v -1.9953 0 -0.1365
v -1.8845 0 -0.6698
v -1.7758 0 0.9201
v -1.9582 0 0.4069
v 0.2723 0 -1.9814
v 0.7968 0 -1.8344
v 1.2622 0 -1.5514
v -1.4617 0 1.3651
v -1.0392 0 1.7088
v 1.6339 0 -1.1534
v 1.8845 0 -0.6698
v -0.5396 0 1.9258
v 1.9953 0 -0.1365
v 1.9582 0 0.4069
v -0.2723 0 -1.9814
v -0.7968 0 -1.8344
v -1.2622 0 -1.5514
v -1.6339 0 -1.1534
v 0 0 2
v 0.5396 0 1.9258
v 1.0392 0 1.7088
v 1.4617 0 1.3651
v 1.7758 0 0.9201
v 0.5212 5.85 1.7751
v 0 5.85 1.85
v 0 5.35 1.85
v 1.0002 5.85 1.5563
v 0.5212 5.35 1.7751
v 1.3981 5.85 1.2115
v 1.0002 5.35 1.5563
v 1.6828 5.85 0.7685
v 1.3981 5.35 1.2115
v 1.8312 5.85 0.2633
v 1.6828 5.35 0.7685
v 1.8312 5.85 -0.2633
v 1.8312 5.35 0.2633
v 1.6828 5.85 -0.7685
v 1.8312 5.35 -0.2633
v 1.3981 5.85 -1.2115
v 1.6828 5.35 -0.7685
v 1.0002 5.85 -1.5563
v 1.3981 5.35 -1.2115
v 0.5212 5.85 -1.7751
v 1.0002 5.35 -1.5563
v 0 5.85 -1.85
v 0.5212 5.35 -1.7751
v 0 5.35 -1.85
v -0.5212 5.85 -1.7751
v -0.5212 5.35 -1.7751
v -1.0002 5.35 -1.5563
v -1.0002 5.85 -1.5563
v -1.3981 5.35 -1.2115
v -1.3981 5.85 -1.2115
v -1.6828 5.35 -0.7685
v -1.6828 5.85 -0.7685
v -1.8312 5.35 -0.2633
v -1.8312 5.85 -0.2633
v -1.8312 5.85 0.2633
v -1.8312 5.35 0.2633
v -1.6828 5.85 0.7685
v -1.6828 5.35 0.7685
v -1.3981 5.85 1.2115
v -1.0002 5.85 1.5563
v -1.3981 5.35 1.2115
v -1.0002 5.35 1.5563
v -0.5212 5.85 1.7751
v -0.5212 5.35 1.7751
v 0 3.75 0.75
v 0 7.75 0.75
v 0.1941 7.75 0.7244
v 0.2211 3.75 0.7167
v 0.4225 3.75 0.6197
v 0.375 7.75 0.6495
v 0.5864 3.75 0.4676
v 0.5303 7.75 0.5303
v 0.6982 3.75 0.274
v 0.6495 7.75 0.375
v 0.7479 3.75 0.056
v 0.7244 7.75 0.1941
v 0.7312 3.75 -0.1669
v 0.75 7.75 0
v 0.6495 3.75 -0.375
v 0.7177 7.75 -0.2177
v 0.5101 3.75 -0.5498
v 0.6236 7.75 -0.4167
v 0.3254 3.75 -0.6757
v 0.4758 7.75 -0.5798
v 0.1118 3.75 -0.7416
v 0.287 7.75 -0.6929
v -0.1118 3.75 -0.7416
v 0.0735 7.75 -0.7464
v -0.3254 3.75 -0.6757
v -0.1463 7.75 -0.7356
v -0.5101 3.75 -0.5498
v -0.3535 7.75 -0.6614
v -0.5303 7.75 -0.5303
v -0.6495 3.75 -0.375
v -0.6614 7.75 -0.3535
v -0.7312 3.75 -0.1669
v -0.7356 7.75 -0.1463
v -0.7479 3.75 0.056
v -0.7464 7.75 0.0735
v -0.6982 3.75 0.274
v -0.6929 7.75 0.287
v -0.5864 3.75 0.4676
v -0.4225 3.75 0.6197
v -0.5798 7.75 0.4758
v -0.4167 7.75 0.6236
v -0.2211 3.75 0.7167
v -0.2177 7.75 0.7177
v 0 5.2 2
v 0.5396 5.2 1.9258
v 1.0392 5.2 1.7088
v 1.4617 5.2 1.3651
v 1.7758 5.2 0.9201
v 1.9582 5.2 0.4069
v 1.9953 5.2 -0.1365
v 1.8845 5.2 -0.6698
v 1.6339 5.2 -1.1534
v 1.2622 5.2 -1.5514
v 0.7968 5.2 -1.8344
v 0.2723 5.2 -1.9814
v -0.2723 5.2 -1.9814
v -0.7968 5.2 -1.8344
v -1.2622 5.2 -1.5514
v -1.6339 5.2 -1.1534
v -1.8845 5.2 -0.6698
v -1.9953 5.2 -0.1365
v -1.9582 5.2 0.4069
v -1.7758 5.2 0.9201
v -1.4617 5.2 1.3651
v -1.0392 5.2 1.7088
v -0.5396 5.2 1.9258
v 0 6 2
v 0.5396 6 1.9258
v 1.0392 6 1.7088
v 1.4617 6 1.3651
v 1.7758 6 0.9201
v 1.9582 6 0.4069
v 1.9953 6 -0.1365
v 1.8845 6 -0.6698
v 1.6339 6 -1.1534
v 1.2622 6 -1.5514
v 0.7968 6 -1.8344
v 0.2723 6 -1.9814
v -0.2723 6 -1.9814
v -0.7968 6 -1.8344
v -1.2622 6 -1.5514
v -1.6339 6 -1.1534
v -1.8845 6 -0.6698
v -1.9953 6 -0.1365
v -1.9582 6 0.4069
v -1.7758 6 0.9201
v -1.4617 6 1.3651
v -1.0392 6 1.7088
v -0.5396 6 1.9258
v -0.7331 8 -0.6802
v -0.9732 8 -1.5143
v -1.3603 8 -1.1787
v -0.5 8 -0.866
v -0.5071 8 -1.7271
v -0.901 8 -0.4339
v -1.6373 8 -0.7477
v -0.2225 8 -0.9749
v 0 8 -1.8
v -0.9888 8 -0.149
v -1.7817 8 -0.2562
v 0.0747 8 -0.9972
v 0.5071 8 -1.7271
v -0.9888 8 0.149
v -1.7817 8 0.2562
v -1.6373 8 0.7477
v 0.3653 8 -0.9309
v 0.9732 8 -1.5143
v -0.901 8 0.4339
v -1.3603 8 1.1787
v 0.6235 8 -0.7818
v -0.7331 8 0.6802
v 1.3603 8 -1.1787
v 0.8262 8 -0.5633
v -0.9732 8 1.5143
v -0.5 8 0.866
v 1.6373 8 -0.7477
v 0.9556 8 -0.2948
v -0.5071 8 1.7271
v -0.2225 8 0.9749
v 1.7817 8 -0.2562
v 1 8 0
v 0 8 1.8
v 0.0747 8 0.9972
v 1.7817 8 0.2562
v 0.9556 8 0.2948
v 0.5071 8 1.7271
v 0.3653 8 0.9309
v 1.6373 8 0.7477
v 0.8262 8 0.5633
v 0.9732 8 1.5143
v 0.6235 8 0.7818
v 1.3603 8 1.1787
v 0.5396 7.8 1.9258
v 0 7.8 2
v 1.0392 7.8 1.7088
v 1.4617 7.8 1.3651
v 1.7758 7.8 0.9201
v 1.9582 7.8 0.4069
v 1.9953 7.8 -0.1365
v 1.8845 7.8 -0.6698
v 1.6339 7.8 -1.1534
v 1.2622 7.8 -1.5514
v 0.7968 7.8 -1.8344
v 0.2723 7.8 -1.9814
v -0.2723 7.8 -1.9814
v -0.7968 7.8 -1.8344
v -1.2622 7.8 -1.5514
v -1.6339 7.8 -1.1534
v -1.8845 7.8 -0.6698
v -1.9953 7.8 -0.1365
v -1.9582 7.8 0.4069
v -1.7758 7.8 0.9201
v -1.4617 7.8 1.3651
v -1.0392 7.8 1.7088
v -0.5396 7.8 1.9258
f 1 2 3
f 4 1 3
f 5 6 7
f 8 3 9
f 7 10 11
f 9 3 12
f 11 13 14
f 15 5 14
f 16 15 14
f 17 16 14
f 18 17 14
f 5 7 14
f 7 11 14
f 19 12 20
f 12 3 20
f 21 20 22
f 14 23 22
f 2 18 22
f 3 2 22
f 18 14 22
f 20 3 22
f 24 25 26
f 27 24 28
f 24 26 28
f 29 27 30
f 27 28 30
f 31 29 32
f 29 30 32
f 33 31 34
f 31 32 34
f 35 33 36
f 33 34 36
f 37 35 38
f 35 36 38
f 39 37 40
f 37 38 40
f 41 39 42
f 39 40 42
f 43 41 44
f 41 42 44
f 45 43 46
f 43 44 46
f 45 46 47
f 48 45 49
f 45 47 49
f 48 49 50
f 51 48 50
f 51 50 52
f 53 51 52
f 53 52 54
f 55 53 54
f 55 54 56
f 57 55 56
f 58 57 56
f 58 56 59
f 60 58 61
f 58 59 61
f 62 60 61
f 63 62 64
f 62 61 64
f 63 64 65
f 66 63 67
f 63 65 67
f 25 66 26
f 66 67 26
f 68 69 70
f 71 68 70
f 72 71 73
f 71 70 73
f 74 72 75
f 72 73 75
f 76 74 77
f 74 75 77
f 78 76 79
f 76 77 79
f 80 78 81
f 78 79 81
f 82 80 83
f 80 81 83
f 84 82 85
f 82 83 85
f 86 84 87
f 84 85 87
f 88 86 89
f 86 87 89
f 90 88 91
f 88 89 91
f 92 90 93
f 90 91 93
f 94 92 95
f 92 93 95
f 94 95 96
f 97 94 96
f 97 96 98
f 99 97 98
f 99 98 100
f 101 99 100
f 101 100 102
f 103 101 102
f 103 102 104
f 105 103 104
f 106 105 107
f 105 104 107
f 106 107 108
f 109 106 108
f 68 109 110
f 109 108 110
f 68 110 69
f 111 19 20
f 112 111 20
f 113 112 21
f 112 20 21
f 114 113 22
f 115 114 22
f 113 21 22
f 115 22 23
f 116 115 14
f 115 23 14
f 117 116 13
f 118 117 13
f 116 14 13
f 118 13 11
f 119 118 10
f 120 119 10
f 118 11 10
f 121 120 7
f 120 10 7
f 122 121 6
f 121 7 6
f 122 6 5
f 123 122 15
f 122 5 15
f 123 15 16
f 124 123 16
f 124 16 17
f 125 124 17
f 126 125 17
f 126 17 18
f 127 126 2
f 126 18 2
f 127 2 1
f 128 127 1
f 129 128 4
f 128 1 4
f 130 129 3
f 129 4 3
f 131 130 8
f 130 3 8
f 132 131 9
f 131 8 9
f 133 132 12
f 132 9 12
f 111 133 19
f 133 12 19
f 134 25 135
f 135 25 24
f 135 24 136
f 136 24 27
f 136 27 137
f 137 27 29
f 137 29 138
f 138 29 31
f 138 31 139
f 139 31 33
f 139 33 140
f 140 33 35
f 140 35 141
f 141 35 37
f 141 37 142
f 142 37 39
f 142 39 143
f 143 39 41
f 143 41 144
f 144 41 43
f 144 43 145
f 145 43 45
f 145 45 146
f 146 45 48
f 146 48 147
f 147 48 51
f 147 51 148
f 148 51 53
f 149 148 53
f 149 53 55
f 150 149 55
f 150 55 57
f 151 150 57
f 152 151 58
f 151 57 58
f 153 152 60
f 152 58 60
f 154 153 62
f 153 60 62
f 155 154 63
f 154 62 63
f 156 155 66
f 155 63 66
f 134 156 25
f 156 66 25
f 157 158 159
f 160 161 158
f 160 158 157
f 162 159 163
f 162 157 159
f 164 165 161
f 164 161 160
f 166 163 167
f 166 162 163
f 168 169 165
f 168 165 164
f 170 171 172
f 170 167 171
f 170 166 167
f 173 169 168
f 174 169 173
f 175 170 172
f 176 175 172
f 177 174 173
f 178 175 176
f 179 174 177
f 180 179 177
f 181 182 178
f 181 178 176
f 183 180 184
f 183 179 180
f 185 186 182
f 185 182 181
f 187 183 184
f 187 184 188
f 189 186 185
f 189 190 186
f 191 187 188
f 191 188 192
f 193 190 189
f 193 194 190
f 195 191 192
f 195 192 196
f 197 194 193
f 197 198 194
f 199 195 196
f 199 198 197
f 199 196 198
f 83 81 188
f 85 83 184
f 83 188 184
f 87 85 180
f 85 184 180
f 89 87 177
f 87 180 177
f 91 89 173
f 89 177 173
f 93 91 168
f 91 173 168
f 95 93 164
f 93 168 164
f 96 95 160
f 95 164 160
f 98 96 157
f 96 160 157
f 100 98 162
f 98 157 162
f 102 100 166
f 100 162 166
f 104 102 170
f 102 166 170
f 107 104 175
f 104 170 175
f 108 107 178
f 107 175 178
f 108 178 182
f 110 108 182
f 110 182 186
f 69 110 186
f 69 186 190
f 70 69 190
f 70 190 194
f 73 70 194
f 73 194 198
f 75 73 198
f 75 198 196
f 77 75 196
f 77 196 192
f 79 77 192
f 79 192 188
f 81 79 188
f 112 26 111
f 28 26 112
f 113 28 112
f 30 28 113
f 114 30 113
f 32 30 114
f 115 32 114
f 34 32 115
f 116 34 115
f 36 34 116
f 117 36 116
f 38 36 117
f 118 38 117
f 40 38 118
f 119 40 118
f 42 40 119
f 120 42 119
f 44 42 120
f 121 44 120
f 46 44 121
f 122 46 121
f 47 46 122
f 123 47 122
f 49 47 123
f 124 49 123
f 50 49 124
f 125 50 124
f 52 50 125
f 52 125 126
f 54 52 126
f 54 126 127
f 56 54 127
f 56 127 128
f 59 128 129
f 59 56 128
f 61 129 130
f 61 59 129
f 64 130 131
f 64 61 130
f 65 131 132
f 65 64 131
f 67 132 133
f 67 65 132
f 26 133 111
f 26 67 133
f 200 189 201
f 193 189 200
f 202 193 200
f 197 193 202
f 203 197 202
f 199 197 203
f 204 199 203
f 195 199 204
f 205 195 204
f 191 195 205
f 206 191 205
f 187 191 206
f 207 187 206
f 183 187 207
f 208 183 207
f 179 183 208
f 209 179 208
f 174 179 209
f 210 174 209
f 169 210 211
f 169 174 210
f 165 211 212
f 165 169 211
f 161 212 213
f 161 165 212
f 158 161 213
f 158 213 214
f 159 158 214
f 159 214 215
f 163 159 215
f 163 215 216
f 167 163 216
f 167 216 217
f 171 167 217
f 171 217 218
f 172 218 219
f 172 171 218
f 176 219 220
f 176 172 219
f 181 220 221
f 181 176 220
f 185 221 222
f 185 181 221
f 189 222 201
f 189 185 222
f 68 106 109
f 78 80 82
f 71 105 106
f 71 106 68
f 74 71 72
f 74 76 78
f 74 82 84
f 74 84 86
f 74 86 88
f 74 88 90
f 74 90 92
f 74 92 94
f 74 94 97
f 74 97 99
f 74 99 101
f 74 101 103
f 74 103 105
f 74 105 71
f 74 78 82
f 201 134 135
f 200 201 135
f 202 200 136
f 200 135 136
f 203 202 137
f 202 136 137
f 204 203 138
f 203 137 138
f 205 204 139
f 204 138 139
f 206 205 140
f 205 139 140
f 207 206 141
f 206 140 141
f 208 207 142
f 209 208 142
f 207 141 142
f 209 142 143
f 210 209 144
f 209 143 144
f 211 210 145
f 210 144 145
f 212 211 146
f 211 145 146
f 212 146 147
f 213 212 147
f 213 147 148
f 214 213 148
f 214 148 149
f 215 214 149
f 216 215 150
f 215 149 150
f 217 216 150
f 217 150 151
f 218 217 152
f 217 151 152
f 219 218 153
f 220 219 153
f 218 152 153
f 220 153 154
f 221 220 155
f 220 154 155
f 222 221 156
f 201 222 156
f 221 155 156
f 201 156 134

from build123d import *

# Parameters (mm, degrees)
SKETCH1_R           = 2
BOSS_EXTRUDE1_DEPTH = 5.2
SKETCH3_R           = 2
BOSS_EXTRUDE2_DEPTH = 0.15
BOSS_EXTRUDE2_TAPER = 45
SKETCH4_R           = 1.85
BOSS_EXTRUDE3_DEPTH = 0.5
SKETCH5_R           = 1.85
BOSS_EXTRUDE4_DEPTH = 0.15
BOSS_EXTRUDE4_DRAFT = -45
SKETCH6_R           = 2
BOSS_EXTRUDE5_DEPTH = 1.8
SKETCH7_R           = 2
BOSS_EXTRUDE6_DEPTH = 0.2
BOSS_EXTRUDE6_TAPER = 45
SKETCH11_R          = 1
CUT_EXTRUDE1_DEPTH  = 0.25
CUT_EXTRUDE1_DRAFT  = -45
SKETCH12_R          = 0.75
CUT_EXTRUDE2_DEPTH  = 4


with BuildPart() as part:
    # Sketch1 → Boss-Extrude1 (new body)
    with BuildSketch(Plane(origin=(0, 0, 0), x_dir=(1, 0, 0), z_dir=(0, 1, 0))):
        with Locations(Location((0, 0, 0), (0, 0, 270))):
            Circle(SKETCH1_R)
    extrude(amount=BOSS_EXTRUDE1_DEPTH)

    # Sketch3 → Boss-Extrude2 (add)
    with BuildSketch(Plane(origin=(0, 5.2, 0), x_dir=(1, 0, 0), z_dir=(0, 1, 0))):
        with Locations(Location((0, 0, 0), (0, 0, 270))):
            Circle(SKETCH3_R)
    extrude(amount=BOSS_EXTRUDE2_DEPTH, taper=BOSS_EXTRUDE2_TAPER)

    # Sketch4 → Boss-Extrude3 (add)
    with BuildSketch(Plane(origin=(0, 5.35, 0), x_dir=(1, 0, 0), z_dir=(0, 1, 0))):
        with Locations(Location((0, 0, 0), (0, 0, 270))):
            Circle(SKETCH4_R)
    extrude(amount=BOSS_EXTRUDE3_DEPTH)


with BuildPart() as boss_extrude4_tool:
    # Sketch5 → Boss-Extrude4 (with draft: the straight prism first)
    with BuildSketch(Plane(origin=(0, 5.85, 0), x_dir=(1, 0, 0), z_dir=(0, 1, 0))):
        with Locations(Location((0, 0, 0), (0, 0, 270))):
            Circle(SKETCH5_R)
    extrude(amount=BOSS_EXTRUDE4_DEPTH)
    # Boss-Extrude4: the draft: its side faces are tilted about the plane it starts from
    boss_extrude4_sides = [boss_extrude4_tool.faces().sort_by_distance(p)[0] for p in [
        (0, 5.925, -1.85),
    ]]
    draft(boss_extrude4_sides, Plane(origin=(0, 5.85, 0), x_dir=(1, 0, 0), z_dir=(0, 1, 0)), BOSS_EXTRUDE4_DRAFT)


with BuildPart() as part_1:
    add(part.part)

    # Boss-Extrude4: add boss_extrude4_tool
    add(boss_extrude4_tool.part)

    # Sketch6 → Boss-Extrude5 (add)
    with BuildSketch(Plane(origin=(0, 6, 0), x_dir=(1, 0, 0), z_dir=(0, 1, 0))):
        with Locations(Location((0, 0, 0), (0, 0, 270))):
            Circle(SKETCH6_R)
    extrude(amount=BOSS_EXTRUDE5_DEPTH)

    # Sketch7 → Boss-Extrude6 (add)
    with BuildSketch(Plane(origin=(0, 7.8, 0), x_dir=(1, 0, 0), z_dir=(0, 1, 0))):
        with Locations(Location((0, 0, 0), (0, 0, 270))):
            Circle(SKETCH7_R)
    extrude(amount=BOSS_EXTRUDE6_DEPTH, taper=BOSS_EXTRUDE6_TAPER)


with BuildPart() as cut_extrude1_tool:
    # Sketch11 → Cut-Extrude1 (with draft: the straight prism first)
    with BuildSketch(Plane(origin=(0, 8, 0), x_dir=(1, 0, 0), z_dir=(0, 1, 0))):
        Circle(SKETCH11_R)
    extrude(amount=-CUT_EXTRUDE1_DEPTH)
    # Cut-Extrude1: the draft: its side faces are tilted about the plane it starts from
    cut_extrude1_sides = [cut_extrude1_tool.faces().sort_by_distance(p)[0] for p in [
        (-1, 7.875, 0),
    ]]
    draft(cut_extrude1_sides, Plane(origin=(0, 8, 0), x_dir=(1, 0, 0), z_dir=(0, 1, 0)), CUT_EXTRUDE1_DRAFT)


with BuildPart() as part_2:
    add(part_1.part)

    # Cut-Extrude1: cut by cut_extrude1_tool
    add(cut_extrude1_tool.part, mode=Mode.SUBTRACT)

    # Sketch12 → Cut-Extrude2 (cut)
    with BuildSketch(Plane(origin=(0, 7.75, 0), x_dir=(1, 0, 0), z_dir=(0, 1, 0))):
        with Locations(Location((0, 0, 0), (0, 0, 270))):
            Circle(SKETCH12_R)
    extrude(amount=-CUT_EXTRUDE2_DEPTH, mode=Mode.SUBTRACT)


solid = part_2.part
